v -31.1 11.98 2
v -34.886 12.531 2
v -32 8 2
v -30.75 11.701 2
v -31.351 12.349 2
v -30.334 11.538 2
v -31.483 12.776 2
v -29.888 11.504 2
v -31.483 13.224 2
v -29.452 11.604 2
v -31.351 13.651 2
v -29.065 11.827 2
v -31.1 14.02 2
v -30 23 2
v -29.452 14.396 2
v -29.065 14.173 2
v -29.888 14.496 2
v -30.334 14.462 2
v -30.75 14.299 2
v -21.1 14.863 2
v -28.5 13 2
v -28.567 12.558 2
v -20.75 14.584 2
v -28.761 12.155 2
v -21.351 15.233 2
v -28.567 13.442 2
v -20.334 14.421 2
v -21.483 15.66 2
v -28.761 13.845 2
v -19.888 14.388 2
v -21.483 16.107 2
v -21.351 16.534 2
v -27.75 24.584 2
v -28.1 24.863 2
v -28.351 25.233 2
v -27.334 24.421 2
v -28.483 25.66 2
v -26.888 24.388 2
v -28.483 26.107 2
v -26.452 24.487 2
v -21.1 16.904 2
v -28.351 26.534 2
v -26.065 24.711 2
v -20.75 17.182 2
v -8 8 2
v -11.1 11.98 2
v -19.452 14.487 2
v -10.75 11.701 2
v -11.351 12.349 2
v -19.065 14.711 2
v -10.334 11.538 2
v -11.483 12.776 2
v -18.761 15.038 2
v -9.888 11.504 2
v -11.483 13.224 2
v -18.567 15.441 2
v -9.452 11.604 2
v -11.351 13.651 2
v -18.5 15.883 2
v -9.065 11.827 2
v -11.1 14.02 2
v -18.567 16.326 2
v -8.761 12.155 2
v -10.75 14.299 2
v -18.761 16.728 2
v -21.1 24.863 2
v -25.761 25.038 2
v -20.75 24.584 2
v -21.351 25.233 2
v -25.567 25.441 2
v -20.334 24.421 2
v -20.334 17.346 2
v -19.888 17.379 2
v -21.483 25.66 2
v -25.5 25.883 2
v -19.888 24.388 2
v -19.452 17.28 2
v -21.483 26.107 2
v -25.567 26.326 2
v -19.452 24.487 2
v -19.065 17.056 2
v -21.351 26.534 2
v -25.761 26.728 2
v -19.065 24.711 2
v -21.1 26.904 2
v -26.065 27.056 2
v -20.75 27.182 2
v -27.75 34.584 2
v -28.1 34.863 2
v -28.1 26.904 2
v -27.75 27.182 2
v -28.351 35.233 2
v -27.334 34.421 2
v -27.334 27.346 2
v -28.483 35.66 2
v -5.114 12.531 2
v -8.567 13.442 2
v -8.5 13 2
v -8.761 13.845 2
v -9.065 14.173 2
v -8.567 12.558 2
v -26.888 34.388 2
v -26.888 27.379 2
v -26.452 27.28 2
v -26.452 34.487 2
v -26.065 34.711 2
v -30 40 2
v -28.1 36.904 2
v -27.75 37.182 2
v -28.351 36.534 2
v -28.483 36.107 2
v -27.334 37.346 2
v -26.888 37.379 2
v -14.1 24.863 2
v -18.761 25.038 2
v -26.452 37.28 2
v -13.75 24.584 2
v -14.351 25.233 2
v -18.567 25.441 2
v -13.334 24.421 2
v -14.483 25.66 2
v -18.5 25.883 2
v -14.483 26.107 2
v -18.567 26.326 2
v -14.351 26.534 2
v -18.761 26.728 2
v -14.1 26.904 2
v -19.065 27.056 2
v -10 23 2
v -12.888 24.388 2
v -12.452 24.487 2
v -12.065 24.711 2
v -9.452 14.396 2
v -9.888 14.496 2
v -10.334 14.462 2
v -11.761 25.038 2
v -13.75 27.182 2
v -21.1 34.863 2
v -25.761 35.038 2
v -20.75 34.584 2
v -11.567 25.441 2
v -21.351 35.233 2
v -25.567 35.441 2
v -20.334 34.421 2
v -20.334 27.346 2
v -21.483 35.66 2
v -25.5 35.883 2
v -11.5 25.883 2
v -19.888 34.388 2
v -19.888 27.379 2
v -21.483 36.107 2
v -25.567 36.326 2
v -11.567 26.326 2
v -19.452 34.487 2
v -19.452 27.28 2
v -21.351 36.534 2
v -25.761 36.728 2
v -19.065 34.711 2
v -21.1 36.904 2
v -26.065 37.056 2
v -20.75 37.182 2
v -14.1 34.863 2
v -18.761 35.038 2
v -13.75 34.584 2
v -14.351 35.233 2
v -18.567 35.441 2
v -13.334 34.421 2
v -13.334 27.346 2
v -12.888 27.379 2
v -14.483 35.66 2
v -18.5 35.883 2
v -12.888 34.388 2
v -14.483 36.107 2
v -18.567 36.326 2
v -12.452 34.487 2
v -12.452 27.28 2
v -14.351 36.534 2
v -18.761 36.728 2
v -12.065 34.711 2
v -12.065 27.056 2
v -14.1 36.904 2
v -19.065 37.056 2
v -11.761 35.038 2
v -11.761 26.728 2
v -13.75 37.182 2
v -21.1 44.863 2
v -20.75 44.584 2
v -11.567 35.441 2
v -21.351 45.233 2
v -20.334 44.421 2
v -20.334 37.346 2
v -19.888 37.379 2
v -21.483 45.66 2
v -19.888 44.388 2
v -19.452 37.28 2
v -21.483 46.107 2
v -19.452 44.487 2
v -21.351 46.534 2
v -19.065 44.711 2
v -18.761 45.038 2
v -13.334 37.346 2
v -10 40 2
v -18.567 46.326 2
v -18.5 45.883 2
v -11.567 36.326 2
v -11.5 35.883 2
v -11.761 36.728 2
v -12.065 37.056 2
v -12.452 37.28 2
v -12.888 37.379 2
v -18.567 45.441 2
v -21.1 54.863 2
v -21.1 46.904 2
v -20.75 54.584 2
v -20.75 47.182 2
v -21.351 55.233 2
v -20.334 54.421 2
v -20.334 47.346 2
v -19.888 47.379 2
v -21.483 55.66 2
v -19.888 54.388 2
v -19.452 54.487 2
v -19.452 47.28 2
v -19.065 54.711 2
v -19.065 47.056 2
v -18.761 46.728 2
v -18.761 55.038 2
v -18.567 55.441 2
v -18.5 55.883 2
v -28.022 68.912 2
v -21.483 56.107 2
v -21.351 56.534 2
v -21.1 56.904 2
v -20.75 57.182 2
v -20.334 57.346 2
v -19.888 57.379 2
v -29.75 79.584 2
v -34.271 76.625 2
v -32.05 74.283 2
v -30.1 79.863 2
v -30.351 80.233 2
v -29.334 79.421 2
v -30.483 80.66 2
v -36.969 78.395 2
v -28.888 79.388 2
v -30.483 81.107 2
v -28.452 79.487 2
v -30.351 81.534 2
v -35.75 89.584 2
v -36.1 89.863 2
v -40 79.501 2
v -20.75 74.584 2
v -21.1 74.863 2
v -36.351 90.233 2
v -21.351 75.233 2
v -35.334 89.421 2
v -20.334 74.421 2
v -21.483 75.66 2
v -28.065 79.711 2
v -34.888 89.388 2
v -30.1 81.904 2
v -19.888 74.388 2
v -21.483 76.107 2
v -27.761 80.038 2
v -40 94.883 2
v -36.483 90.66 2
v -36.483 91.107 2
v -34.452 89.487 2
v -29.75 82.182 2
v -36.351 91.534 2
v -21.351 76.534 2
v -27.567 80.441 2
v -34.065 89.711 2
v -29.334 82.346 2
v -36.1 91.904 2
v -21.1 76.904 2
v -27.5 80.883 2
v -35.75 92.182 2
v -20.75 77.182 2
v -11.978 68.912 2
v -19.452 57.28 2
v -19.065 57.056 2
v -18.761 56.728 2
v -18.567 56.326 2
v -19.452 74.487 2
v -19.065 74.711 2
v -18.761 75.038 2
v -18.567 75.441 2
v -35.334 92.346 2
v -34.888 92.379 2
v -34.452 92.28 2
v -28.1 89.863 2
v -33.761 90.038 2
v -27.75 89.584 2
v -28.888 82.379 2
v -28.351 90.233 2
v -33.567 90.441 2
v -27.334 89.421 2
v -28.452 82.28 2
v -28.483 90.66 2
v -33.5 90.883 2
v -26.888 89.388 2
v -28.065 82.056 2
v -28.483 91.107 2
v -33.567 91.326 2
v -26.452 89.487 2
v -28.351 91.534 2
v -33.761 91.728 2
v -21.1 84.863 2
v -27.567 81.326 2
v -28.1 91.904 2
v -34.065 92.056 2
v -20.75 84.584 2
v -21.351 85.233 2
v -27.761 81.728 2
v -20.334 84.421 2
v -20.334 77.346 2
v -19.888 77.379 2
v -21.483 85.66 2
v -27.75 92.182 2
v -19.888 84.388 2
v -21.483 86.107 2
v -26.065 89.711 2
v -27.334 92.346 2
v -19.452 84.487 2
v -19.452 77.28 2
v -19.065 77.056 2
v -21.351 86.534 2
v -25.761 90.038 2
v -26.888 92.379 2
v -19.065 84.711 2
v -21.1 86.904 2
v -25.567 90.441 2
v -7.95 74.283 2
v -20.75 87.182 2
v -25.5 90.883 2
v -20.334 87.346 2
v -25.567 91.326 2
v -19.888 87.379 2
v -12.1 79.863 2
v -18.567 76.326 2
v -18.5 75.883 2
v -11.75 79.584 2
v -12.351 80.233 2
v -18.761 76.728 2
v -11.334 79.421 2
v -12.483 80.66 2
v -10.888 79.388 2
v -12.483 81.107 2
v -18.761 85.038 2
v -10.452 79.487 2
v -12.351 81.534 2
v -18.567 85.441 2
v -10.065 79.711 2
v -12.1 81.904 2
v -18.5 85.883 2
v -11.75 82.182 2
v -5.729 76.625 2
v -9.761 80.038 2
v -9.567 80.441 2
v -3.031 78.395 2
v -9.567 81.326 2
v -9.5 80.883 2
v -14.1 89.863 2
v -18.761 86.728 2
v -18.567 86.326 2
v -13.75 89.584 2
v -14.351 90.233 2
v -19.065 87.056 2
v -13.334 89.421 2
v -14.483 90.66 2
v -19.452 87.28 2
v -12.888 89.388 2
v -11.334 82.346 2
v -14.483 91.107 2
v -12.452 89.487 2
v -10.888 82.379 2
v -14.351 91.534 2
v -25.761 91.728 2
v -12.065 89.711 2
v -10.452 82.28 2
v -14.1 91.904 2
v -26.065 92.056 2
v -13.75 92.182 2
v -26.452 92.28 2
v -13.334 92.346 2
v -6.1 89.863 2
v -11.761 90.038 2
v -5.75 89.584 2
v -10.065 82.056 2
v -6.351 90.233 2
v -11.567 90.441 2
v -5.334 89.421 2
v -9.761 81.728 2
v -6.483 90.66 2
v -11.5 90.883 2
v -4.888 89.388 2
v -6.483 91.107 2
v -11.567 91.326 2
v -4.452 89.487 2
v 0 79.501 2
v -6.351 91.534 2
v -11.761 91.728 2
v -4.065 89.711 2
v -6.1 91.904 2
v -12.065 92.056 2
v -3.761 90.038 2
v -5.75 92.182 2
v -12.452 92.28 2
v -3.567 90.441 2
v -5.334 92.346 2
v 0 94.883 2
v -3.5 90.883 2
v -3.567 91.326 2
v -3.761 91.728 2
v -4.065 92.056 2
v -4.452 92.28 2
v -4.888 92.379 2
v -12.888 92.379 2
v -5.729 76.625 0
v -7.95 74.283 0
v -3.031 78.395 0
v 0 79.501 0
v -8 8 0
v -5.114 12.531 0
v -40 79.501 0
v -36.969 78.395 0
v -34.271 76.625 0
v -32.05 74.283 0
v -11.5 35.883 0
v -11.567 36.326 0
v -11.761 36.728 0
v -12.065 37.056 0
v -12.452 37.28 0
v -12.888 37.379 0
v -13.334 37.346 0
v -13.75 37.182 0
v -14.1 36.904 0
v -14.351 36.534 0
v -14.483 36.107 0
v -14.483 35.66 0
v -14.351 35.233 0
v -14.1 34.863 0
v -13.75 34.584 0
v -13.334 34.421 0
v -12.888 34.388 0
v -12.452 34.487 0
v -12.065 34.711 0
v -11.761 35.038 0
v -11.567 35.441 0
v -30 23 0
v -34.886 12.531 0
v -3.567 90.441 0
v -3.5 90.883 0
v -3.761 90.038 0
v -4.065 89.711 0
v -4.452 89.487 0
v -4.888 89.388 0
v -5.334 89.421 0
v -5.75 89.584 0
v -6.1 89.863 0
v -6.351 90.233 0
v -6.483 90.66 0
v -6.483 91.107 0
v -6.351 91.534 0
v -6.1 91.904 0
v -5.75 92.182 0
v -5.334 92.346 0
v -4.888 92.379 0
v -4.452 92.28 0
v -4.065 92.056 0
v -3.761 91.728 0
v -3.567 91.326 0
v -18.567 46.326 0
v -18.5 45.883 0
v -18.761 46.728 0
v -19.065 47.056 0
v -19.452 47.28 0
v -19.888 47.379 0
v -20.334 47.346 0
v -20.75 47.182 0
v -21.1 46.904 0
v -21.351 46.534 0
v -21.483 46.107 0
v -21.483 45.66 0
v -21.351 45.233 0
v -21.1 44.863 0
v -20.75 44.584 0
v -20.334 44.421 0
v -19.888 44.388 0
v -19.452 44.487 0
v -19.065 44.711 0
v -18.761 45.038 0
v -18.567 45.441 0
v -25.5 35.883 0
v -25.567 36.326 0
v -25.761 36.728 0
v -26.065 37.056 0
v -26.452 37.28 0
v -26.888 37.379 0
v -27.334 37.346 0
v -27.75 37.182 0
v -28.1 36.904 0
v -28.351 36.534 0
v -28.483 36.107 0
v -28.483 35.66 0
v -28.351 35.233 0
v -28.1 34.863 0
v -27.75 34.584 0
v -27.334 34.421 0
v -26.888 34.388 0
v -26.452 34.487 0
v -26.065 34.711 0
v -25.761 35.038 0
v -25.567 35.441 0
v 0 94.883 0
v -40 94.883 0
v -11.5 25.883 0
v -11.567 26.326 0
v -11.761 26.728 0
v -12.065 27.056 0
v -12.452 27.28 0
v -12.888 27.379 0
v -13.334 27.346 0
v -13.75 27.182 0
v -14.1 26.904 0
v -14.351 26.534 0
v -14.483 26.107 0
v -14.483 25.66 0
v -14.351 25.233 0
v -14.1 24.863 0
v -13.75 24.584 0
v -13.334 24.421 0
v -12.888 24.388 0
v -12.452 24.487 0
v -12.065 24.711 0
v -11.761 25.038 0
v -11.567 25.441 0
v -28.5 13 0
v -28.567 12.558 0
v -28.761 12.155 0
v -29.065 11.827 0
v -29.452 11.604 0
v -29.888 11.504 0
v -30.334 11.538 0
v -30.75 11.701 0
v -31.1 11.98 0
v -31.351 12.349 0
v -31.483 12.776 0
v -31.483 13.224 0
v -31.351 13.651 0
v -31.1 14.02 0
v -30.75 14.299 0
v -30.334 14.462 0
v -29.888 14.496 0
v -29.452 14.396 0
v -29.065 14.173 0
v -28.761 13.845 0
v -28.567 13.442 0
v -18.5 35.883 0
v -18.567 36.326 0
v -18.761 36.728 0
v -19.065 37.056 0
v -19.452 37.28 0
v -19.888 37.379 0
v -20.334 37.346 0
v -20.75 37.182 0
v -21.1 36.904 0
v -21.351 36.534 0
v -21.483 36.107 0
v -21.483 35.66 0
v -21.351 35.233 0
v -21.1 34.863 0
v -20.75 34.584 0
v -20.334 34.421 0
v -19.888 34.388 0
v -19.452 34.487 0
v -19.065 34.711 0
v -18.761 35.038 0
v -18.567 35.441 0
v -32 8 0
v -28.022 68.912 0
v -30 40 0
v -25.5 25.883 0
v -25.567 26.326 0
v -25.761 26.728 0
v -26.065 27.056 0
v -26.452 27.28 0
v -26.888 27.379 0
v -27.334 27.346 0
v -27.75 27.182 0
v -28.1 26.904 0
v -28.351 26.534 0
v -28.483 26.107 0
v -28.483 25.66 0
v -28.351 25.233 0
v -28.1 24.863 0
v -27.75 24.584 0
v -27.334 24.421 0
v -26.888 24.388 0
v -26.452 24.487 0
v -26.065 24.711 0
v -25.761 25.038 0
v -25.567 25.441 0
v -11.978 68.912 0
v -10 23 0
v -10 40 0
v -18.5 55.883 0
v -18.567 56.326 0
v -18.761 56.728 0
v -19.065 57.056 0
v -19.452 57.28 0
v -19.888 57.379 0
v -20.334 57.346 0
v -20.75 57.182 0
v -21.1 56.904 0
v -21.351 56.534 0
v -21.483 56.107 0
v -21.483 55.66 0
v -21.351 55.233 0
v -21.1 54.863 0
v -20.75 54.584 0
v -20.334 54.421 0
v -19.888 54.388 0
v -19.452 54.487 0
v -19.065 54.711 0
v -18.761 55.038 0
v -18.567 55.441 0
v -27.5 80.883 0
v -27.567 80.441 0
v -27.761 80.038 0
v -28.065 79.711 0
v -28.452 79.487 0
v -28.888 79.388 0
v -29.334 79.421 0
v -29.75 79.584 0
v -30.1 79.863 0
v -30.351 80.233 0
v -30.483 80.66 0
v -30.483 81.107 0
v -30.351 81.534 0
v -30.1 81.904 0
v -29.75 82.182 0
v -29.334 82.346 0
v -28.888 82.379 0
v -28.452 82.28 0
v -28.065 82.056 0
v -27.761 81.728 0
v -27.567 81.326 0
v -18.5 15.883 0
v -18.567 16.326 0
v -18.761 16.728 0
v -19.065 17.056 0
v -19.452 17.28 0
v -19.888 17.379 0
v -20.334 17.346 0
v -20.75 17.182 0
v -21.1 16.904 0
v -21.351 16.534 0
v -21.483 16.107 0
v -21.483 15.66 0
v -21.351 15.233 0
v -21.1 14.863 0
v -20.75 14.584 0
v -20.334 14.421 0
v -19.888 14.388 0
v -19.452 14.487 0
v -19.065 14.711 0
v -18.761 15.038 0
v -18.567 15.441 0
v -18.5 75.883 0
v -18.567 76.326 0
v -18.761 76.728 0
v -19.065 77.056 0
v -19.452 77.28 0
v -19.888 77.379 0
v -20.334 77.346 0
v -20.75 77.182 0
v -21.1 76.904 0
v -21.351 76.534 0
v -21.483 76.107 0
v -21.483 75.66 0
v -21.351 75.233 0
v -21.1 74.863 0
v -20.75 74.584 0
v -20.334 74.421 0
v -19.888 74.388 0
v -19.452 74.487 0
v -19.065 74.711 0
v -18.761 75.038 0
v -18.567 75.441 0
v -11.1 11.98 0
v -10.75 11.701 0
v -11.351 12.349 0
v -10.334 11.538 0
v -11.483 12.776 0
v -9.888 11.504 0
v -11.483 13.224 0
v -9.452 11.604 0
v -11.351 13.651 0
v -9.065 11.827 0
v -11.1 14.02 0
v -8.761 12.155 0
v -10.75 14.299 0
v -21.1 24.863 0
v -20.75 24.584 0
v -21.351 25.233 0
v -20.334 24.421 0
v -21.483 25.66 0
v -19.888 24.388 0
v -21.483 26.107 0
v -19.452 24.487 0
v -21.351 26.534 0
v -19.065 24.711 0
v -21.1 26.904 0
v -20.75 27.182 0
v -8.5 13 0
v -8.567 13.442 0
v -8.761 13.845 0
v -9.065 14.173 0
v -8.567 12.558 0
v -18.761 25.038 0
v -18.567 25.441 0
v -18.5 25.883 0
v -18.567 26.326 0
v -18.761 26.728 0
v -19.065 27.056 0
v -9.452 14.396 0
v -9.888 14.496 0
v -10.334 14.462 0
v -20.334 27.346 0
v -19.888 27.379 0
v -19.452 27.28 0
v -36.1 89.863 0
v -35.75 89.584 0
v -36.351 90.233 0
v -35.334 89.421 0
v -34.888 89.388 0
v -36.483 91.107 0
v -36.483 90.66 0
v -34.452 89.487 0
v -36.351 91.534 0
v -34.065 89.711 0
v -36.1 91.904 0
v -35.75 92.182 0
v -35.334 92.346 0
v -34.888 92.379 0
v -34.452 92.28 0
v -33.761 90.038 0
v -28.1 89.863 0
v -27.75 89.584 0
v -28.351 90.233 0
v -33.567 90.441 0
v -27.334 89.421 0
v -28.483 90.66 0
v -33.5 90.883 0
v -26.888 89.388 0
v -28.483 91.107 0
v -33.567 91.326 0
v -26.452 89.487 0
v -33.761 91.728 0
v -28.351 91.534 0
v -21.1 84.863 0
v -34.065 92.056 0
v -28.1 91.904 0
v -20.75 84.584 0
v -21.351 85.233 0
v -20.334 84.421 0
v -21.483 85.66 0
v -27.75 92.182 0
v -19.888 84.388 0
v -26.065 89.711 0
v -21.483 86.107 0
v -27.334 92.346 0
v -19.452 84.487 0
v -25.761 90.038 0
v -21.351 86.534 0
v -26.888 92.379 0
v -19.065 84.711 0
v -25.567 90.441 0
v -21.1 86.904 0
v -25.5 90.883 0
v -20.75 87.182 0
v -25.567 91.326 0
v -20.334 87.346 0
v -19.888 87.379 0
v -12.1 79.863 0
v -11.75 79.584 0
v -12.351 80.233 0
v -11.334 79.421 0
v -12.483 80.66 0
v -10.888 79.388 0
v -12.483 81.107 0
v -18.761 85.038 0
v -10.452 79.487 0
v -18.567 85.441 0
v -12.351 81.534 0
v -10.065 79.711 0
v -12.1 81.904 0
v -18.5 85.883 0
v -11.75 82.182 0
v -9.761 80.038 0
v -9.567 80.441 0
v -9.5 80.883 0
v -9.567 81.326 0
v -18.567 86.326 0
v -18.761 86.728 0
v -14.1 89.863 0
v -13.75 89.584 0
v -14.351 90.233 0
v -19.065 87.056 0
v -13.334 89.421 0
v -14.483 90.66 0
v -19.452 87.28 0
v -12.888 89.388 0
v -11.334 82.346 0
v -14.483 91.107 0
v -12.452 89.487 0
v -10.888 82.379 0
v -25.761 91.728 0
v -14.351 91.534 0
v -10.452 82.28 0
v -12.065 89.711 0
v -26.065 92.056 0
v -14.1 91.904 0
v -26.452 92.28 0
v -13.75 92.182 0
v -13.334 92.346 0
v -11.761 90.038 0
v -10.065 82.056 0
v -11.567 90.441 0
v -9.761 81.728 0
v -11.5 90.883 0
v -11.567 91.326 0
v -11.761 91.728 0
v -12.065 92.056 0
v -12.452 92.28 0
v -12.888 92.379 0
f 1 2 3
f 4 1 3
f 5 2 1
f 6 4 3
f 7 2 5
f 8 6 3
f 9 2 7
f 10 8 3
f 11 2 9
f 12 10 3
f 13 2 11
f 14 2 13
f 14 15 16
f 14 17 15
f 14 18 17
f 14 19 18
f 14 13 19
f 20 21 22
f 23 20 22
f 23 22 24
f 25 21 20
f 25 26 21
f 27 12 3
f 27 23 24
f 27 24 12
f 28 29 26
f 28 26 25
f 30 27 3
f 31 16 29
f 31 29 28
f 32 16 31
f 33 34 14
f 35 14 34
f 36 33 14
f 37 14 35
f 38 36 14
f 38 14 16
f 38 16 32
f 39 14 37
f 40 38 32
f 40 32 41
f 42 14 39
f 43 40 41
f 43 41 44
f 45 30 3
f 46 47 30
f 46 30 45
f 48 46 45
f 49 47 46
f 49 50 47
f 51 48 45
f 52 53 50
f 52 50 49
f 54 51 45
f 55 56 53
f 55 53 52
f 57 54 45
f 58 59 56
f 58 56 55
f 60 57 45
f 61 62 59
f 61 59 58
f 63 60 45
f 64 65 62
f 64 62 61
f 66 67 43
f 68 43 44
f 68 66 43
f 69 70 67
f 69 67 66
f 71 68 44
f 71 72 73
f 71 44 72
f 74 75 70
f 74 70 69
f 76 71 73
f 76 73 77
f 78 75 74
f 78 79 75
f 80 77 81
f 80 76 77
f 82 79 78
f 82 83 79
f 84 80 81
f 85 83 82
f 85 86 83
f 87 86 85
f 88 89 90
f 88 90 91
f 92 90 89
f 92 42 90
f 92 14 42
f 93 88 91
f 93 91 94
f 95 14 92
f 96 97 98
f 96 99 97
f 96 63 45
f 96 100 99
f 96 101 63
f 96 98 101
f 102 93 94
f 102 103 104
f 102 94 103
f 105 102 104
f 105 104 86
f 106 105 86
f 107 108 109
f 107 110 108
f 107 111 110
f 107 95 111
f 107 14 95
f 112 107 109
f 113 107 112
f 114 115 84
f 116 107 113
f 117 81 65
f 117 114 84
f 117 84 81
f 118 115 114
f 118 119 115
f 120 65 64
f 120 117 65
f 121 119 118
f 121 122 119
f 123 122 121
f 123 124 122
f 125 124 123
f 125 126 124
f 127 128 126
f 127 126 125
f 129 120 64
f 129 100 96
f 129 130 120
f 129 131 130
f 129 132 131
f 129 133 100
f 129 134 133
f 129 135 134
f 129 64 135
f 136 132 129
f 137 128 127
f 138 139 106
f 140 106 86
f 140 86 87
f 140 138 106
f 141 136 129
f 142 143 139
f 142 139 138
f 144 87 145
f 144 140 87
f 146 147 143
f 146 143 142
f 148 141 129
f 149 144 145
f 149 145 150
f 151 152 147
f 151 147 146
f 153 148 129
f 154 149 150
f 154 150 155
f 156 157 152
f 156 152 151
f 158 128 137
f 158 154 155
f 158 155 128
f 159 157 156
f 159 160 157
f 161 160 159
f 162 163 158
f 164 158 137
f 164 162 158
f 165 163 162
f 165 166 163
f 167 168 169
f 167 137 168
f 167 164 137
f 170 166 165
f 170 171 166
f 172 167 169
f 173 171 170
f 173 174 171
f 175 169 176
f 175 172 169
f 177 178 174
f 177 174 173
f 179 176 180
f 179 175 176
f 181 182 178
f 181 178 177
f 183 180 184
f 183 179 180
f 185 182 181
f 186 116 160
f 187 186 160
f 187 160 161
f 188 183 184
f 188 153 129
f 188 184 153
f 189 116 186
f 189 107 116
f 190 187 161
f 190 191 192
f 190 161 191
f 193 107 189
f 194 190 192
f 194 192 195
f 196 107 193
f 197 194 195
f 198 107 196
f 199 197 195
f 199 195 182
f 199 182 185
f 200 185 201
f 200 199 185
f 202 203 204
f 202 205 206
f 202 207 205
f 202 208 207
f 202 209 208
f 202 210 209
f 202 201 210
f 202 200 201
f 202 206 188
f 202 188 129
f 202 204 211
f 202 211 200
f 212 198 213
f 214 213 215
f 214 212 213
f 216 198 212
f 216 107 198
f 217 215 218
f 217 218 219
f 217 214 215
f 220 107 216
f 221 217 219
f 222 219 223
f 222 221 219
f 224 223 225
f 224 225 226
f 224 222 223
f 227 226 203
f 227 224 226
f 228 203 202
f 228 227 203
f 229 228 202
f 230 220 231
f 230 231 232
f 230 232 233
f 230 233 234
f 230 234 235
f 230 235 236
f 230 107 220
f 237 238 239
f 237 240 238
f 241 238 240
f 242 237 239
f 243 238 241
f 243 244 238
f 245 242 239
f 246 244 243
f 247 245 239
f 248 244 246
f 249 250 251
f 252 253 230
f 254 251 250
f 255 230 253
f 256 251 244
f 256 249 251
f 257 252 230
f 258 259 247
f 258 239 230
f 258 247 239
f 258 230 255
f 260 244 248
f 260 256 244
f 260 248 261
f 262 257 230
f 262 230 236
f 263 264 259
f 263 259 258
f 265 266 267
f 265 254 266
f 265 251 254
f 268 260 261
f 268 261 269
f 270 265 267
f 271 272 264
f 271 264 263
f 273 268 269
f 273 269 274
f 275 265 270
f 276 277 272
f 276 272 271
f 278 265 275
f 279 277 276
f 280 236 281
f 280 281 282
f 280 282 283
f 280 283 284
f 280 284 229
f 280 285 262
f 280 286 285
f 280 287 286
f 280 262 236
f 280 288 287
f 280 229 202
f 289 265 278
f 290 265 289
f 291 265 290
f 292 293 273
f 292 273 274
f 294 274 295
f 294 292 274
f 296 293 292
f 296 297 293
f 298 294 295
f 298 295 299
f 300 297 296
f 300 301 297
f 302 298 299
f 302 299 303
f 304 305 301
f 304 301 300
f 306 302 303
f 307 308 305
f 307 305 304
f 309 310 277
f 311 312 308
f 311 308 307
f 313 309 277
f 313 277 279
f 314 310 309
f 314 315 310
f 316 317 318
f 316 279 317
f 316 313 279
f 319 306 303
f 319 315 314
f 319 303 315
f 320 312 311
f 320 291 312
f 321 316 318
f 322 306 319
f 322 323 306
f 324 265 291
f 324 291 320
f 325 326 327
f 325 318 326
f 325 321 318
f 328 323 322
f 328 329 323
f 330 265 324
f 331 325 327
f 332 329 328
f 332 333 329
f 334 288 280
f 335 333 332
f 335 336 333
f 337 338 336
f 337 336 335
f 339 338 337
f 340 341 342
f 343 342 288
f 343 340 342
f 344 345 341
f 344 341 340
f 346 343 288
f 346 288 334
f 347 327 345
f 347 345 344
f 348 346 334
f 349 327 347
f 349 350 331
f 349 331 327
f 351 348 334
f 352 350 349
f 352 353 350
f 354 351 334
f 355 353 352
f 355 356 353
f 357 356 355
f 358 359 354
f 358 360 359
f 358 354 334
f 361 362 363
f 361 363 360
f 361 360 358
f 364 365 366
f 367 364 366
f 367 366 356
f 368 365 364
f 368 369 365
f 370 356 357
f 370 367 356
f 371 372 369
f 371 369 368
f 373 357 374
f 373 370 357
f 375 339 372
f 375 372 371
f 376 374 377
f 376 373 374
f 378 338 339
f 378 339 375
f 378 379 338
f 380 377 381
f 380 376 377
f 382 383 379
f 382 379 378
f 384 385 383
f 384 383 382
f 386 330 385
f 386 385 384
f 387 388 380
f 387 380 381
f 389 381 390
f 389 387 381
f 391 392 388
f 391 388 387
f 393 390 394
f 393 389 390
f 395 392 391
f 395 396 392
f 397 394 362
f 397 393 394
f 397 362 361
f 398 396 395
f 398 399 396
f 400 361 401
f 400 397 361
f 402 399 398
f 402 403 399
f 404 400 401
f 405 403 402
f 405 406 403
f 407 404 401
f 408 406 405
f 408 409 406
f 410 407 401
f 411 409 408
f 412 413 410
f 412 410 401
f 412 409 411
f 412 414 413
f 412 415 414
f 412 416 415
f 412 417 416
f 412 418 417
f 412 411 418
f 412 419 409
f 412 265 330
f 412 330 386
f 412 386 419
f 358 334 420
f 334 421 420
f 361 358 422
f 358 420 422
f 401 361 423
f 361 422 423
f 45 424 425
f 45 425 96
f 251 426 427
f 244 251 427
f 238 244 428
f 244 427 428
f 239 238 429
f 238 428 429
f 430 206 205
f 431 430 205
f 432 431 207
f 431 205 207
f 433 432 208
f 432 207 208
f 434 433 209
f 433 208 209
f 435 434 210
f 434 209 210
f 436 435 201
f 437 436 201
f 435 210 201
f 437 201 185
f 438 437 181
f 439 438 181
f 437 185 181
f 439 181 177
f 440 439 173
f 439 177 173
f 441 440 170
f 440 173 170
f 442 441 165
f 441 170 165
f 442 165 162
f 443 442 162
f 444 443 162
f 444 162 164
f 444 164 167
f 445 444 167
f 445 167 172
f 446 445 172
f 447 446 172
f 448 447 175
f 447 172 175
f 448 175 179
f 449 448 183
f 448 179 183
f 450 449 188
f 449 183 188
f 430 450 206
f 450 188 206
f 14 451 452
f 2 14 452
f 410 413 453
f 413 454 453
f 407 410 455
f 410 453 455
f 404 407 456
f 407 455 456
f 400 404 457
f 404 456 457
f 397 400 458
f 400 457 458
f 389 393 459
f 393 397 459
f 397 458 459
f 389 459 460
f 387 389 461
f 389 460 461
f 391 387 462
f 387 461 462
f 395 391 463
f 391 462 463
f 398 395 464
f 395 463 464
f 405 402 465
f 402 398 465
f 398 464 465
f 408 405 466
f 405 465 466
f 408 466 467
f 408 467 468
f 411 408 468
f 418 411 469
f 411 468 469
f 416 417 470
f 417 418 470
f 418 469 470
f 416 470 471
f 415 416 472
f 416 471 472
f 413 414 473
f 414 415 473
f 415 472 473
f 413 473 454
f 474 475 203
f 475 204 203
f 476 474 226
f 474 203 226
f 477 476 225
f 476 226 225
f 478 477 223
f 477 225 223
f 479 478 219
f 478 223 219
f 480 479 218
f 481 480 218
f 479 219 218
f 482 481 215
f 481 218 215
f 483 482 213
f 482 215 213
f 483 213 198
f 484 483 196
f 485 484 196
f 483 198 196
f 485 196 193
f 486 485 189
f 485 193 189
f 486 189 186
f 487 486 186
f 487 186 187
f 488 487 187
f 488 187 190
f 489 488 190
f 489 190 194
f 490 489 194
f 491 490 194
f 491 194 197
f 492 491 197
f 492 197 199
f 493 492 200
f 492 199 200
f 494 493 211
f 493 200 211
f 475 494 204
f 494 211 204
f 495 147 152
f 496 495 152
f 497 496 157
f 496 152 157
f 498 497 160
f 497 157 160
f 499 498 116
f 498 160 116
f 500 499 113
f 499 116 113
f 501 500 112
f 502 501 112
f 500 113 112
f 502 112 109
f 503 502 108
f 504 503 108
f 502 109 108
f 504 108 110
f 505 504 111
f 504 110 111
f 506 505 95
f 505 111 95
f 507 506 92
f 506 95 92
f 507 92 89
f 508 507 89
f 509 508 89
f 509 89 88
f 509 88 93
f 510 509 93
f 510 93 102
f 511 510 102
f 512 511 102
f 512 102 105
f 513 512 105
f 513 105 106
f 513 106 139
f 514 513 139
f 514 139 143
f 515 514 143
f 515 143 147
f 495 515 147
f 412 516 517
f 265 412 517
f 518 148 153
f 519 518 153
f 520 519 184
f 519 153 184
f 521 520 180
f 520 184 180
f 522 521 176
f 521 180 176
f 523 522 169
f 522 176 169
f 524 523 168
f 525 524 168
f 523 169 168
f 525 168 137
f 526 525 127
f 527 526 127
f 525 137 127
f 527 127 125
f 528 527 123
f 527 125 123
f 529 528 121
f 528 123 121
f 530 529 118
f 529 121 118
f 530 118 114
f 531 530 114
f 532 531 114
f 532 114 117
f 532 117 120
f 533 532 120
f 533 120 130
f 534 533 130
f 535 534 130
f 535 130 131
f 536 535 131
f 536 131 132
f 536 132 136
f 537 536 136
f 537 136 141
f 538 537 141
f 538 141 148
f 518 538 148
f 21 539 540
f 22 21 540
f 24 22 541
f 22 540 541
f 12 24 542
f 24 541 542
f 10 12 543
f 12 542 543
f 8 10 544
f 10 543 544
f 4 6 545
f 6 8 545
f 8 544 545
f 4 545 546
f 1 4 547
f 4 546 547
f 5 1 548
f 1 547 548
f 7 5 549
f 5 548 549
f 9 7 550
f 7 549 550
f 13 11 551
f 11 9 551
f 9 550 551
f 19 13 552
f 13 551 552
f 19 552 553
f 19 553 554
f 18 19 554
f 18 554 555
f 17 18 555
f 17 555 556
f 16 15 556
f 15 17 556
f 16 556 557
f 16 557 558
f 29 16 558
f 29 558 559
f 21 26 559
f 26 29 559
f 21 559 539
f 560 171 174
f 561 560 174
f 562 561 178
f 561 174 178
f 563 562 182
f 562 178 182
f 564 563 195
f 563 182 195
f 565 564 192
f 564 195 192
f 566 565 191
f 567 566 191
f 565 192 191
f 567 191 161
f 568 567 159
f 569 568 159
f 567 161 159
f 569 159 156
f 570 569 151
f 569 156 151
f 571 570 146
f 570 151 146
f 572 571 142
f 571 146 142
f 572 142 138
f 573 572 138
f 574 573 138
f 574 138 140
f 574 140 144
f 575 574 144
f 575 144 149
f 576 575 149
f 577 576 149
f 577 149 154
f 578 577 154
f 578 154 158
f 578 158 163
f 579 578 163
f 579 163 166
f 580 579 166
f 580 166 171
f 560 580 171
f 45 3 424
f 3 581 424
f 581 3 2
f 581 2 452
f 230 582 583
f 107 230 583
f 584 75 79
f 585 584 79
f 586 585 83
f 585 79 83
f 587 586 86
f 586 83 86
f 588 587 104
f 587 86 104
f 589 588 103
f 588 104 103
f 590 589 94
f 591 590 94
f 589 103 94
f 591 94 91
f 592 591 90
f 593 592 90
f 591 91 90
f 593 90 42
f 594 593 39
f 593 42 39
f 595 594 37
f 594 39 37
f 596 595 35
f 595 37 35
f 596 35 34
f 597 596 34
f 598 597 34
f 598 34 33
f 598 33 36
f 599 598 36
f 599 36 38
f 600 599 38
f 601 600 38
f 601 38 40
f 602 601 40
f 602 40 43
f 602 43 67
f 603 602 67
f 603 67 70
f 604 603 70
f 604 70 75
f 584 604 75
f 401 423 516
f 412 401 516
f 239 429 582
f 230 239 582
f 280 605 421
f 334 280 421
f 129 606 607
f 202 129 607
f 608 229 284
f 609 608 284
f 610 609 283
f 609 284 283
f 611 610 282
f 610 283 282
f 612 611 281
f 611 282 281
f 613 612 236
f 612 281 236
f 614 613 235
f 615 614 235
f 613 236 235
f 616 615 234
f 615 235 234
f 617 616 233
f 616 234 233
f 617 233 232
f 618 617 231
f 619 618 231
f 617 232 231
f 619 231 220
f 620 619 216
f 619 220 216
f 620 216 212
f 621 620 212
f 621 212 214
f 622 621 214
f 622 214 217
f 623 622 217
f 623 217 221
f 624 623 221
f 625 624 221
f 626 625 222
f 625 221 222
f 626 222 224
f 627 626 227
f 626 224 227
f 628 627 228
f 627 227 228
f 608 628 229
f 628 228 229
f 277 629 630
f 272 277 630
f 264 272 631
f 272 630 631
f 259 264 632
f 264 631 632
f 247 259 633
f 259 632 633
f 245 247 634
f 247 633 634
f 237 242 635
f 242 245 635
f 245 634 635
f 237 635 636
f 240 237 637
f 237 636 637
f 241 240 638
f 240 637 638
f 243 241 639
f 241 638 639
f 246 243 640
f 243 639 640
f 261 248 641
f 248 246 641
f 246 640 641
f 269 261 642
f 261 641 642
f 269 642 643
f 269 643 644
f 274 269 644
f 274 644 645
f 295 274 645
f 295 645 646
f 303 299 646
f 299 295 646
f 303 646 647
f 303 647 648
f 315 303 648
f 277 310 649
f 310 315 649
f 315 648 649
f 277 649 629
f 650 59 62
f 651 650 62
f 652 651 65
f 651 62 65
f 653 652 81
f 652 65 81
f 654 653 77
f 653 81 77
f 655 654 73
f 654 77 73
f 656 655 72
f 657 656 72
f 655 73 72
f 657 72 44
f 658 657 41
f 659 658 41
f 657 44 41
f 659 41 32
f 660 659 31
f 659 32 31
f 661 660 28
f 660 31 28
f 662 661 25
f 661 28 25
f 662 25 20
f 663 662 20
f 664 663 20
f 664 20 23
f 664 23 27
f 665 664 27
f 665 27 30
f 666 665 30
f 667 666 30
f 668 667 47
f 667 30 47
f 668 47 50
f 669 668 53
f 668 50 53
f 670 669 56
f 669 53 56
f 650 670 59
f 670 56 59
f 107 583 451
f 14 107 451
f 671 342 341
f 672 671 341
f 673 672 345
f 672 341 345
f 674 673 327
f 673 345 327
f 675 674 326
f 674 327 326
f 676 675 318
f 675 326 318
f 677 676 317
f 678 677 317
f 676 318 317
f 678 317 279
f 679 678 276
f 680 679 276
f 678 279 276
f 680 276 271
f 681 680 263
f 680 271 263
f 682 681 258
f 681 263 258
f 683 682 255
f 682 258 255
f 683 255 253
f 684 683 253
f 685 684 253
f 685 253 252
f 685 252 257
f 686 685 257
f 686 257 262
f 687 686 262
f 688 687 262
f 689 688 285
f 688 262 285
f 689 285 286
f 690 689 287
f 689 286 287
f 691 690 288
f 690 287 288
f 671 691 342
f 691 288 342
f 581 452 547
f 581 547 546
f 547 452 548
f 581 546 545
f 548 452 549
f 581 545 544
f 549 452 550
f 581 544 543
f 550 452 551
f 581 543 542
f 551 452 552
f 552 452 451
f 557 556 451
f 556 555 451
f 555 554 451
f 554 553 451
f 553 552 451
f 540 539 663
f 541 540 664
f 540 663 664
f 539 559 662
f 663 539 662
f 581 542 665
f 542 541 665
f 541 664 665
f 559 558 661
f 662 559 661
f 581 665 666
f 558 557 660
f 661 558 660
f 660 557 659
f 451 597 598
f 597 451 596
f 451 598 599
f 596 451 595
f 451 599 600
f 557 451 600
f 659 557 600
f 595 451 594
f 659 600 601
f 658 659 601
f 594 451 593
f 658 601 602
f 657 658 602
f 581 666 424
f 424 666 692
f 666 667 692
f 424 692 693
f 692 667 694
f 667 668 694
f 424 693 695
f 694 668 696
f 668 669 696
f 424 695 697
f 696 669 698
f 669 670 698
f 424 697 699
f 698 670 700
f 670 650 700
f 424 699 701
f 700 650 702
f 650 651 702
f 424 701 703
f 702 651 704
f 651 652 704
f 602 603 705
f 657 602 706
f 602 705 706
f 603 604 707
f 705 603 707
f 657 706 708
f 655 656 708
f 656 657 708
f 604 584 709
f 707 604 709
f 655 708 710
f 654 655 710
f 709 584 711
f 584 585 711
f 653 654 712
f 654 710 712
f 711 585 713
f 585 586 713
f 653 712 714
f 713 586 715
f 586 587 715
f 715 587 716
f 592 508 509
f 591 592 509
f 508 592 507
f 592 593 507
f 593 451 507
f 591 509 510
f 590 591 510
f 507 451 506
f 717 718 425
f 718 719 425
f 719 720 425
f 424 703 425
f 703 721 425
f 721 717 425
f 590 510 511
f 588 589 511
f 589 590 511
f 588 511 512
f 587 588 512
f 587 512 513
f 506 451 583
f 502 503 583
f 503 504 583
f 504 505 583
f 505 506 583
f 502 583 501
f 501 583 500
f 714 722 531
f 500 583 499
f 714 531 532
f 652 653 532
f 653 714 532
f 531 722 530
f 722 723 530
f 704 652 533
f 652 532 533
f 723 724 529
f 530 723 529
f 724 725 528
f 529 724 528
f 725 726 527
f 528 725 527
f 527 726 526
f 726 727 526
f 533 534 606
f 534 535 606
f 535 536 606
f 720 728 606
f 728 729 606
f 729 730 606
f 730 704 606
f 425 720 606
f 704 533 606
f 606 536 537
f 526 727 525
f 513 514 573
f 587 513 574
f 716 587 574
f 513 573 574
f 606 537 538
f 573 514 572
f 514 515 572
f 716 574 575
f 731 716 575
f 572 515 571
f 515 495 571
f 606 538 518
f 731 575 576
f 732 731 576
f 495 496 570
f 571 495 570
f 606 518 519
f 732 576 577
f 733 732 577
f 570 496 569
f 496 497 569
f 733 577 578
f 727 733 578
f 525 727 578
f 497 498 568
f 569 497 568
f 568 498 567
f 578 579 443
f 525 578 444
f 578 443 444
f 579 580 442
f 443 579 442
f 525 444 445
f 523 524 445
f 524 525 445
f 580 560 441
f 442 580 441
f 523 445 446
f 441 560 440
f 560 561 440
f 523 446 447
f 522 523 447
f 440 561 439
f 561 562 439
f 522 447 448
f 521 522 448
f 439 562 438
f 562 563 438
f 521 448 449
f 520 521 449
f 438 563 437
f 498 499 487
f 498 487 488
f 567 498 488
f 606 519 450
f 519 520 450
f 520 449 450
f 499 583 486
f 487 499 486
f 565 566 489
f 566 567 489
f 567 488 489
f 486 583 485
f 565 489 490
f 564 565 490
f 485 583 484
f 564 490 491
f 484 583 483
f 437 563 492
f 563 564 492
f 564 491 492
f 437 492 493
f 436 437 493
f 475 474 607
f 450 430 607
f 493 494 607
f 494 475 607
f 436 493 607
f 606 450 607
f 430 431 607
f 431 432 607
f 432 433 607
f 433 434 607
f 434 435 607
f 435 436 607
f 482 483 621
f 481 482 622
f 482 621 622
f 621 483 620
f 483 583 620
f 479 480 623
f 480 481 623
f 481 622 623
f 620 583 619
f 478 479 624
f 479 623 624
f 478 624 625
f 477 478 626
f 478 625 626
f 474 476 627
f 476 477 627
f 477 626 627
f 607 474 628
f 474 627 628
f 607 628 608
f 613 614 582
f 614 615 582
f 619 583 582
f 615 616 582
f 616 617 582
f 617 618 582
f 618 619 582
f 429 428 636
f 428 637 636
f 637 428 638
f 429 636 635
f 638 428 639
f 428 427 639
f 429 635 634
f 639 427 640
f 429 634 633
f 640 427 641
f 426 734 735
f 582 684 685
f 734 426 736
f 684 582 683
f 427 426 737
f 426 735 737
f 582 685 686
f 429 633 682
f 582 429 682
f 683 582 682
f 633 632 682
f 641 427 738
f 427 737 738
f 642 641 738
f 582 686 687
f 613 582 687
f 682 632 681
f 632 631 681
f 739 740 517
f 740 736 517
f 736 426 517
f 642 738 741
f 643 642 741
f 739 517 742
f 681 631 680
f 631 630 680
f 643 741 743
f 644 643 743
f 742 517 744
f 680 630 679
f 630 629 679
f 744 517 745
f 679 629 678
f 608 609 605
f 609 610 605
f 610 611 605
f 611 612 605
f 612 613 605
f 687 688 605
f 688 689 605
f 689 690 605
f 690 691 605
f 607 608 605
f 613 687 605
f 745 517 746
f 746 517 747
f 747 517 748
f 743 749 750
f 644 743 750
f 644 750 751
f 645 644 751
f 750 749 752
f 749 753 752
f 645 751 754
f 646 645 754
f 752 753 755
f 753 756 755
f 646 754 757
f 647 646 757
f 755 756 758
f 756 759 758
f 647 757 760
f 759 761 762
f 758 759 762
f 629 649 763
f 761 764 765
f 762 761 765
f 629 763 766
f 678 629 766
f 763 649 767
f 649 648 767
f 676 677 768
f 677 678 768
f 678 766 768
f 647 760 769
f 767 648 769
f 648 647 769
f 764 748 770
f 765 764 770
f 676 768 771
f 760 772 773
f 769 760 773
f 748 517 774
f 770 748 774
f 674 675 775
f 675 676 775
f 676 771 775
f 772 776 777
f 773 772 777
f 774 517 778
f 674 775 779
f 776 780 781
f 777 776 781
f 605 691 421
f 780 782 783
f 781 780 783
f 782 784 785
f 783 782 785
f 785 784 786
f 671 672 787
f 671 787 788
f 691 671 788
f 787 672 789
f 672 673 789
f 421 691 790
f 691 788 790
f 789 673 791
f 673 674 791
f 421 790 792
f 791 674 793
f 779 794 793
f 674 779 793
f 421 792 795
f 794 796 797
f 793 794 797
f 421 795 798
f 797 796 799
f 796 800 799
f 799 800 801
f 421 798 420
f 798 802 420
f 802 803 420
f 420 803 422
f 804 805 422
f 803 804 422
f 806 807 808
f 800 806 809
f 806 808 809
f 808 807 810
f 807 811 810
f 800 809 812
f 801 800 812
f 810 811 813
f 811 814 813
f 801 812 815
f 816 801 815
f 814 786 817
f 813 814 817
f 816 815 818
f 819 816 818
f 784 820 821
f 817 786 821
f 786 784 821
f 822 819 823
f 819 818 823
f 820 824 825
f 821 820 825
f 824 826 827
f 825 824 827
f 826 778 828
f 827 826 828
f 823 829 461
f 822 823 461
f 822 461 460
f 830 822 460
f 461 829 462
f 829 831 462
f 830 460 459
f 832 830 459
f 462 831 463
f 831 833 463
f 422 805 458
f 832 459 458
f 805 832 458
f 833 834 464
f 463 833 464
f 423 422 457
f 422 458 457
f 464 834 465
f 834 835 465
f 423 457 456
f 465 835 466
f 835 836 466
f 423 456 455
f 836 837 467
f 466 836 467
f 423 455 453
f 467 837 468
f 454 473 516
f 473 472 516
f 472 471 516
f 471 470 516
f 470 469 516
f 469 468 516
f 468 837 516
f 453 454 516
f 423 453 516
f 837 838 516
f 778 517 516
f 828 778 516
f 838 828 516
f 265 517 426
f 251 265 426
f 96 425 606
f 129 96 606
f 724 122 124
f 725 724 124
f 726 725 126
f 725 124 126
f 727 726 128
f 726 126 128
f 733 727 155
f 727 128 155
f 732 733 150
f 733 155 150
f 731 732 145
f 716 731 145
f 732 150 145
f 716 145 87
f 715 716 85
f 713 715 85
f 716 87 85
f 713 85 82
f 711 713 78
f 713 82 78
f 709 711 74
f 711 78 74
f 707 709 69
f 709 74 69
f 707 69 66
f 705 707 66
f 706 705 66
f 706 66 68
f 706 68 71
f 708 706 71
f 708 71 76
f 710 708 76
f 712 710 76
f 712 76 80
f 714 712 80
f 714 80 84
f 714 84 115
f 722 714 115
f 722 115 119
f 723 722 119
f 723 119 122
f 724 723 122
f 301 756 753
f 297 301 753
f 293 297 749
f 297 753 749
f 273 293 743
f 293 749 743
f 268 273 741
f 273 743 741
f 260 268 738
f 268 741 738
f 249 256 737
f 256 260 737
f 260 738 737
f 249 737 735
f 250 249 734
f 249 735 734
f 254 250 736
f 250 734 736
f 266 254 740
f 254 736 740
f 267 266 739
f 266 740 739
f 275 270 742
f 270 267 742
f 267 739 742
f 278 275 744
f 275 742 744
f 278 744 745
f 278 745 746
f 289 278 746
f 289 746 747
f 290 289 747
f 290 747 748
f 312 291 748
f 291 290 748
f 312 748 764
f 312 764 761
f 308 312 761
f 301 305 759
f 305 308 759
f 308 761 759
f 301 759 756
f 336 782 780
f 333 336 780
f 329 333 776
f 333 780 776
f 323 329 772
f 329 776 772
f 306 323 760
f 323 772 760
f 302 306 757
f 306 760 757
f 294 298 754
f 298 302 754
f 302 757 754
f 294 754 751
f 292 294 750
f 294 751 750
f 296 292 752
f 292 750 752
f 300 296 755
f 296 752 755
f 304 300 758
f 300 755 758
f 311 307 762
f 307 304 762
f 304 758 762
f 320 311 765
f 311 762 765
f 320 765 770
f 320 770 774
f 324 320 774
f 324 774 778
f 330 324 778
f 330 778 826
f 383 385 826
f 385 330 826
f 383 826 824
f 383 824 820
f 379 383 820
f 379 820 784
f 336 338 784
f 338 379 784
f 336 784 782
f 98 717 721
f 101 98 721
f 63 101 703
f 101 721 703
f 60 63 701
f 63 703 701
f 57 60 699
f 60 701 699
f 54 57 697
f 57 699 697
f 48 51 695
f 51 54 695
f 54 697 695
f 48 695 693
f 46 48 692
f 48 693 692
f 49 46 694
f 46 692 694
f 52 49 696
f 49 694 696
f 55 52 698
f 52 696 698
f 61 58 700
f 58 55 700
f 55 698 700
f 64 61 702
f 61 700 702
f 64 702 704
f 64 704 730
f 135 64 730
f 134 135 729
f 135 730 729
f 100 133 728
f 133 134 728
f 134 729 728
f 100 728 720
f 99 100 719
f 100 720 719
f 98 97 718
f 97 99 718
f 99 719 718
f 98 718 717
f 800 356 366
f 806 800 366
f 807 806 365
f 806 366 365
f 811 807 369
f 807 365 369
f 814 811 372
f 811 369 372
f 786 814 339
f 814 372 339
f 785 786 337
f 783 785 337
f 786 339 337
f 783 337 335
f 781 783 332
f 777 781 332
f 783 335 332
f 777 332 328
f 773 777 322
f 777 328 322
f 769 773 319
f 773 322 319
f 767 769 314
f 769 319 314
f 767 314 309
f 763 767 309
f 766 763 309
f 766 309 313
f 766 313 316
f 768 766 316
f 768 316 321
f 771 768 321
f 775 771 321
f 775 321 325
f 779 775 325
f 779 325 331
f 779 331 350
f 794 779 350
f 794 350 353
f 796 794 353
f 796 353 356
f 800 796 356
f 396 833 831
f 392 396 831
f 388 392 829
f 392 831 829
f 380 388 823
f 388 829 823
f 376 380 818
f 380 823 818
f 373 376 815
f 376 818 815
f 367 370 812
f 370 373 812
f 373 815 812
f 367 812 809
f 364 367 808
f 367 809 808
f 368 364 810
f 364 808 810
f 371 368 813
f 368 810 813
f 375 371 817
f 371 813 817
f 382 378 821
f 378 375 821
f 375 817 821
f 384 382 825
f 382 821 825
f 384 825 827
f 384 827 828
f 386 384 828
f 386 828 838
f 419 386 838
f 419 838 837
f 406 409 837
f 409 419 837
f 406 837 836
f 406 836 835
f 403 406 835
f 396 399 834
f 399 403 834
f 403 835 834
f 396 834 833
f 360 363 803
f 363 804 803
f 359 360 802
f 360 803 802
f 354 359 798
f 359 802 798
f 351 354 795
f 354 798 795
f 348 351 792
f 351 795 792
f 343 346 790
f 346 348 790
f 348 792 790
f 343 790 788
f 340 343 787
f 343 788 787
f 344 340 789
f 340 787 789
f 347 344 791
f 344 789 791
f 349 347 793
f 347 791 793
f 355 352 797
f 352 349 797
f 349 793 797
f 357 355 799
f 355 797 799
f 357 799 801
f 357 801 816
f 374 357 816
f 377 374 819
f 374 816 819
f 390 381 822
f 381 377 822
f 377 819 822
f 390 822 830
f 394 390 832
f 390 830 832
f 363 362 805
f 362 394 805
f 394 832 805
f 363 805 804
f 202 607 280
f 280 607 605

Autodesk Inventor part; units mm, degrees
ref_plane "YZ Plane" through (0, 0, 0) normal (1, 0, 0) x (0, 1, 0)
ref_plane "XZ Plane" through (0, 0, 0) normal (0, 1, 0) x (-1, 0, 0)
ref_plane "XY Plane" through (0, 0, 0) normal (0, 0, 1) x (1, 0, 0)
sketch "Sketch1" plane through (0, 0, 0) normal (0, 0, 1) x (1, 0, 0)
  circle A0 centre (-34, 4) radius 1.5
  circle A1 centre (-30, 13) radius 1.5
  circle A2 centre (-27, 4) radius 1.5
  line L0 (-30, 23) -> (-30, 40)
  line L1 (-39.076923, 9.384615) -> (-30, 23)
  line L2 (-40, 0) -> (-40, 8)
  line L3 (-40, 0) -> (-20, 0)
  line L4 (-20, 0) -> (-20, 40)
  line L5 (-20, 40) -> (-30, 40)
  circle A3 centre (-6, 4) radius 1.5
  circle A4 centre (-10, 13) radius 1.5
  circle A5 centre (-13, 4) radius 1.5
  line L6 (-10, 23) -> (-10, 40)
  line L7 (-20, 40) -> (-10, 40)
  line L8 (-20, 0) -> (-20, 40)
  line L9 (0, 0) -> (-20, 0)
  line L10 (0, 0) -> (0, 8)
  line L11 (-0.923077, 9.384615) -> (-10, 23)
  line L12 (-3, 8) -> (-37, 8)
  circle A6 centre (-29, 80.883435) radius 1.5
  circle A7 centre (-27, 90.883435) radius 1.5
  circle A8 centre (-35, 90.883435) radius 1.5
  line L13 (-40, 79.500979) -> (-40, 94.883435)
  arc A9 (-32.05, 74.283435) -> (-40, 79.500979) centre (-43.25, 65.883435) ccw
  line L14 (-28.021661, 68.912316) -> (-32.05, 74.283435)
  line L15 (-20, 68.912316) -> (-28.021661, 68.912316)
  line L16 (-20, 94.883435) -> (-20, 68.912316)
  line L17 (-40, 94.883435) -> (-20, 94.883435)
  circle A10 centre (-11, 80.883435) radius 1.5
  circle A11 centre (-13, 90.883435) radius 1.5
  circle A12 centre (-5, 90.883435) radius 1.5
  line L18 (0, 79.500979) -> (0, 94.883435)
  line L19 (0, 94.883435) -> (-20, 94.883435)
  line L20 (-20, 94.883435) -> (-20, 68.912316)
  line L21 (-20, 68.912316) -> (-11.978339, 68.912316)
  line L22 (-11.978339, 68.912316) -> (-7.95, 74.283435)
  arc A13 (0, 79.500979) -> (-7.95, 74.283435) centre (3.25, 65.883435) ccw
  line L23 (-10, 40) -> (-11.978339, 68.912316)
  line L24 (-28.021661, 68.912316) -> (-30, 40)
sketch "Sketch1 outline for Extrusion1" plane through (0, 0, 0) normal (0, 0, 1) x (1, 0, 0)
  line L0 (-37, 8) -> (-3, 8)
  line L1 (-30, 23) -> (-37, 8)
  line L2 (-3, 8) -> (-10, 23)
  line L3 (-30, 40) -> (-30, 23)
  line L4 (-10, 23) -> (-10, 40)
  line L5 (-28.021661, 68.912316) -> (-30, 40)
  line L6 (-10, 40) -> (-11.978339, 68.912316)
  line L7 (-32.05, 74.283435) -> (-28.021661, 68.912316)
  line L8 (-11.978339, 68.912316) -> (-7.95, 74.283435)
  arc A0 (-40, 79.500979) -> (-32.05, 74.283435) centre (-43.25, 65.883435) cw
  arc A1 (-7.95, 74.283435) -> (0, 79.500979) centre (3.25, 65.883435) cw
  line L9 (-40, 94.883435) -> (-40, 79.500979)
  line L10 (0, 79.500979) -> (0, 94.883435)
  line L11 (-20, 94.883435) -> (-40, 94.883435)
  line L12 (0, 94.883435) -> (-20, 94.883435)
  circle A2 centre (-30, 13) radius 1.5
  circle A3 centre (-10, 13) radius 1.5
  circle A4 centre (-29, 80.883435) radius 1.5
  circle A5 centre (-35, 90.883435) radius 1.5
  circle A6 centre (-27, 90.883435) radius 1.5
  circle A7 centre (-13, 90.883435) radius 1.5
  circle A8 centre (-11, 80.883435) radius 1.5
  circle A9 centre (-5, 90.883435) radius 1.5
extrude "Extrusion1" add sketch "Sketch1 outline for Extrusion1" along normal blind 2
chamfer "Chamfer1" distance 5 angle 45 2 edges at (-37, 8, 1) (-3, 8, 1)
sketch "Sketch2" plane through (0, 0, 2) normal (0, 0, 1) x (1, 0, 0)
  circle A0 centre (-27, 35.883435) radius 1.5
  circle A1 centre (-13, 35.883435) radius 1.5
  circle A2 centre (-13, 25.883435) radius 1.5
  circle A3 centre (-27, 25.883435) radius 1.5
  circle A4 centre (-20, 75.883435) radius 1.5
  circle A5 centre (-20, 25.883435) radius 1.5
  circle A6 centre (-20, 15.883435) radius 1.5
  circle A7 centre (-20, 35.883435) radius 1.5
  circle A8 centre (-20, 85.883435) radius 1.5
  line L0 (-5, 8) -> (-2.773501, 12.160251)
  line L1 (-5, 8) -> (-35, 8)
  line L2 (-37.226499, 12.160251) -> (-35, 8)
  line L3 (-37.226499, 12.160251) -> (-30, 23)
  line L4 (-30, 23) -> (-30, 40)
  line L5 (-30, 40) -> (-26, 40)
  arc A9 (-26, 40) -> (-23, 43) centre (-26, 43) ccw
  line L6 (-23, 43) -> (-23, 65.912316)
  arc A10 (-23, 65.912316) -> (-26, 68.912316) centre (-26, 65.912316) ccw
  line L7 (-26, 68.912316) -> (-28.021661, 68.912316)
  line L8 (-28.021661, 68.912316) -> (-32.05, 74.283435)
  arc A11 (-32.05, 74.283435) -> (-40, 79.500979) centre (-43.25, 65.883435) ccw
  line L9 (-40, 79.500979) -> (-40, 94.883435)
  line L10 (-40, 94.883435) -> (0, 94.883435)
  line L11 (0, 94.883435) -> (0, 79.500979)
  arc A12 (0, 79.500979) -> (-7.95, 74.283435) centre (3.25, 65.883435) ccw
  line L12 (-7.95, 74.283435) -> (-11.978339, 68.912316)
  line L13 (-11.978339, 68.912316) -> (-14, 68.912316)
  arc A13 (-14, 68.912316) -> (-17, 65.912316) centre (-14, 65.912316) ccw
  line L14 (-17, 65.912316) -> (-17, 43)
  arc A14 (-17, 43) -> (-14, 40) centre (-14, 43) ccw
  line L15 (-14, 40) -> (-10, 40)
  line L16 (-10, 40) -> (-10, 23)
  line L17 (-10, 23) -> (-2.773501, 12.160251)
  circle A15 centre (-30, 13) radius 1.5
  circle A16 centre (-27, 90.883435) radius 1.5
  circle A17 centre (-29, 80.883435) radius 1.5
  circle A18 centre (-35, 90.883435) radius 1.5
  circle A19 centre (-11, 80.883435) radius 1.5
  circle A20 centre (-13, 90.883435) radius 1.5
  circle A21 centre (-5, 90.883435) radius 1.5
  circle A22 centre (-10, 13) radius 1.5
  point P0 (0, 0)
extrude "Extrusion2" cut sketch "Sketch2" against normal blind 10 contours A0 | A1 | A2 | A3 | A4 | A5 | A6 | A7 | A8
sketch "Sketch3" plane through (0, 0, 2) normal (0, 0, 1) x (1, 0, 0)
  circle A0 centre (-13, 35.883435) radius 1.5
  circle A1 centre (-20, 35.883435) radius 1.5
  circle A2 centre (-27, 35.883435) radius 1.5
  circle A3 centre (-13, 25.883435) radius 1.5
  circle A4 centre (-20, 75.883435) radius 1.5
  circle A5 centre (-20, 25.883435) radius 1.5
  circle A6 centre (-27, 25.883435) radius 1.5
  circle A7 centre (-20, 15.883435) radius 1.5
  circle A8 centre (-20, 85.883435) radius 1.5
  line L0 (-5.114427, 12.530916) -> (-8, 8)
  line L1 (-5.114427, 12.530916) -> (-10, 23)
  line L2 (-10, 23) -> (-10, 40)
  line L3 (-10, 40) -> (-11.978339, 68.912316)
  line L4 (-11.978339, 68.912316) -> (-7.95, 74.283435)
  arc A9 (0, 79.500979) -> (-7.95, 74.283435) centre (3.25, 65.883435) ccw
  line L5 (0, 79.500979) -> (0, 94.883435)
  line L6 (0, 94.883435) -> (-40, 94.883435)
  line L7 (-40, 94.883435) -> (-40, 79.500979)
  arc A10 (-32.05, 74.283435) -> (-40, 79.500979) centre (-43.25, 65.883435) ccw
  line L8 (-32.05, 74.283435) -> (-28.021661, 68.912316)
  line L9 (-28.021661, 68.912316) -> (-30, 40)
  line L10 (-30, 40) -> (-30, 23)
  line L11 (-30, 23) -> (-34.885573, 12.530916)
  line L12 (-32, 8) -> (-34.885573, 12.530916)
  line L13 (-32, 8) -> (-8, 8)
  circle A11 centre (-13, 90.883435) radius 1.5
  circle A12 centre (-11, 80.883435) radius 1.5
  circle A13 centre (-5, 90.883435) radius 1.5
  circle A14 centre (-29, 80.883435) radius 1.5
  circle A15 centre (-27, 90.883435) radius 1.5
  circle A16 centre (-35, 90.883435) radius 1.5
  circle A17 centre (-30, 13) radius 1.5
  circle A18 centre (-10, 13) radius 1.5
  circle A19 centre (-20, 75.883435) radius 1.5
  line L14 (-20, 75.883435) -> (-20, 55.883435)
  line L15 (-20, 55.883435) -> (-20, 45.883435)
  circle A20 centre (-20, 55.883435) radius 1.5
  circle A21 centre (-20, 45.883435) radius 1.5
  point P0 (0, 0)
  dimension "d7" = 20
  dimension "d8" = 10
  dimension "d9" = 3
  dimension "d10" = 3
extrude "Extrusion3" cut sketch "Sketch3" against normal blind 10 contours A20 L15 L14 | L14 L15 A20 | A21
properties part number "body_bone_3"
